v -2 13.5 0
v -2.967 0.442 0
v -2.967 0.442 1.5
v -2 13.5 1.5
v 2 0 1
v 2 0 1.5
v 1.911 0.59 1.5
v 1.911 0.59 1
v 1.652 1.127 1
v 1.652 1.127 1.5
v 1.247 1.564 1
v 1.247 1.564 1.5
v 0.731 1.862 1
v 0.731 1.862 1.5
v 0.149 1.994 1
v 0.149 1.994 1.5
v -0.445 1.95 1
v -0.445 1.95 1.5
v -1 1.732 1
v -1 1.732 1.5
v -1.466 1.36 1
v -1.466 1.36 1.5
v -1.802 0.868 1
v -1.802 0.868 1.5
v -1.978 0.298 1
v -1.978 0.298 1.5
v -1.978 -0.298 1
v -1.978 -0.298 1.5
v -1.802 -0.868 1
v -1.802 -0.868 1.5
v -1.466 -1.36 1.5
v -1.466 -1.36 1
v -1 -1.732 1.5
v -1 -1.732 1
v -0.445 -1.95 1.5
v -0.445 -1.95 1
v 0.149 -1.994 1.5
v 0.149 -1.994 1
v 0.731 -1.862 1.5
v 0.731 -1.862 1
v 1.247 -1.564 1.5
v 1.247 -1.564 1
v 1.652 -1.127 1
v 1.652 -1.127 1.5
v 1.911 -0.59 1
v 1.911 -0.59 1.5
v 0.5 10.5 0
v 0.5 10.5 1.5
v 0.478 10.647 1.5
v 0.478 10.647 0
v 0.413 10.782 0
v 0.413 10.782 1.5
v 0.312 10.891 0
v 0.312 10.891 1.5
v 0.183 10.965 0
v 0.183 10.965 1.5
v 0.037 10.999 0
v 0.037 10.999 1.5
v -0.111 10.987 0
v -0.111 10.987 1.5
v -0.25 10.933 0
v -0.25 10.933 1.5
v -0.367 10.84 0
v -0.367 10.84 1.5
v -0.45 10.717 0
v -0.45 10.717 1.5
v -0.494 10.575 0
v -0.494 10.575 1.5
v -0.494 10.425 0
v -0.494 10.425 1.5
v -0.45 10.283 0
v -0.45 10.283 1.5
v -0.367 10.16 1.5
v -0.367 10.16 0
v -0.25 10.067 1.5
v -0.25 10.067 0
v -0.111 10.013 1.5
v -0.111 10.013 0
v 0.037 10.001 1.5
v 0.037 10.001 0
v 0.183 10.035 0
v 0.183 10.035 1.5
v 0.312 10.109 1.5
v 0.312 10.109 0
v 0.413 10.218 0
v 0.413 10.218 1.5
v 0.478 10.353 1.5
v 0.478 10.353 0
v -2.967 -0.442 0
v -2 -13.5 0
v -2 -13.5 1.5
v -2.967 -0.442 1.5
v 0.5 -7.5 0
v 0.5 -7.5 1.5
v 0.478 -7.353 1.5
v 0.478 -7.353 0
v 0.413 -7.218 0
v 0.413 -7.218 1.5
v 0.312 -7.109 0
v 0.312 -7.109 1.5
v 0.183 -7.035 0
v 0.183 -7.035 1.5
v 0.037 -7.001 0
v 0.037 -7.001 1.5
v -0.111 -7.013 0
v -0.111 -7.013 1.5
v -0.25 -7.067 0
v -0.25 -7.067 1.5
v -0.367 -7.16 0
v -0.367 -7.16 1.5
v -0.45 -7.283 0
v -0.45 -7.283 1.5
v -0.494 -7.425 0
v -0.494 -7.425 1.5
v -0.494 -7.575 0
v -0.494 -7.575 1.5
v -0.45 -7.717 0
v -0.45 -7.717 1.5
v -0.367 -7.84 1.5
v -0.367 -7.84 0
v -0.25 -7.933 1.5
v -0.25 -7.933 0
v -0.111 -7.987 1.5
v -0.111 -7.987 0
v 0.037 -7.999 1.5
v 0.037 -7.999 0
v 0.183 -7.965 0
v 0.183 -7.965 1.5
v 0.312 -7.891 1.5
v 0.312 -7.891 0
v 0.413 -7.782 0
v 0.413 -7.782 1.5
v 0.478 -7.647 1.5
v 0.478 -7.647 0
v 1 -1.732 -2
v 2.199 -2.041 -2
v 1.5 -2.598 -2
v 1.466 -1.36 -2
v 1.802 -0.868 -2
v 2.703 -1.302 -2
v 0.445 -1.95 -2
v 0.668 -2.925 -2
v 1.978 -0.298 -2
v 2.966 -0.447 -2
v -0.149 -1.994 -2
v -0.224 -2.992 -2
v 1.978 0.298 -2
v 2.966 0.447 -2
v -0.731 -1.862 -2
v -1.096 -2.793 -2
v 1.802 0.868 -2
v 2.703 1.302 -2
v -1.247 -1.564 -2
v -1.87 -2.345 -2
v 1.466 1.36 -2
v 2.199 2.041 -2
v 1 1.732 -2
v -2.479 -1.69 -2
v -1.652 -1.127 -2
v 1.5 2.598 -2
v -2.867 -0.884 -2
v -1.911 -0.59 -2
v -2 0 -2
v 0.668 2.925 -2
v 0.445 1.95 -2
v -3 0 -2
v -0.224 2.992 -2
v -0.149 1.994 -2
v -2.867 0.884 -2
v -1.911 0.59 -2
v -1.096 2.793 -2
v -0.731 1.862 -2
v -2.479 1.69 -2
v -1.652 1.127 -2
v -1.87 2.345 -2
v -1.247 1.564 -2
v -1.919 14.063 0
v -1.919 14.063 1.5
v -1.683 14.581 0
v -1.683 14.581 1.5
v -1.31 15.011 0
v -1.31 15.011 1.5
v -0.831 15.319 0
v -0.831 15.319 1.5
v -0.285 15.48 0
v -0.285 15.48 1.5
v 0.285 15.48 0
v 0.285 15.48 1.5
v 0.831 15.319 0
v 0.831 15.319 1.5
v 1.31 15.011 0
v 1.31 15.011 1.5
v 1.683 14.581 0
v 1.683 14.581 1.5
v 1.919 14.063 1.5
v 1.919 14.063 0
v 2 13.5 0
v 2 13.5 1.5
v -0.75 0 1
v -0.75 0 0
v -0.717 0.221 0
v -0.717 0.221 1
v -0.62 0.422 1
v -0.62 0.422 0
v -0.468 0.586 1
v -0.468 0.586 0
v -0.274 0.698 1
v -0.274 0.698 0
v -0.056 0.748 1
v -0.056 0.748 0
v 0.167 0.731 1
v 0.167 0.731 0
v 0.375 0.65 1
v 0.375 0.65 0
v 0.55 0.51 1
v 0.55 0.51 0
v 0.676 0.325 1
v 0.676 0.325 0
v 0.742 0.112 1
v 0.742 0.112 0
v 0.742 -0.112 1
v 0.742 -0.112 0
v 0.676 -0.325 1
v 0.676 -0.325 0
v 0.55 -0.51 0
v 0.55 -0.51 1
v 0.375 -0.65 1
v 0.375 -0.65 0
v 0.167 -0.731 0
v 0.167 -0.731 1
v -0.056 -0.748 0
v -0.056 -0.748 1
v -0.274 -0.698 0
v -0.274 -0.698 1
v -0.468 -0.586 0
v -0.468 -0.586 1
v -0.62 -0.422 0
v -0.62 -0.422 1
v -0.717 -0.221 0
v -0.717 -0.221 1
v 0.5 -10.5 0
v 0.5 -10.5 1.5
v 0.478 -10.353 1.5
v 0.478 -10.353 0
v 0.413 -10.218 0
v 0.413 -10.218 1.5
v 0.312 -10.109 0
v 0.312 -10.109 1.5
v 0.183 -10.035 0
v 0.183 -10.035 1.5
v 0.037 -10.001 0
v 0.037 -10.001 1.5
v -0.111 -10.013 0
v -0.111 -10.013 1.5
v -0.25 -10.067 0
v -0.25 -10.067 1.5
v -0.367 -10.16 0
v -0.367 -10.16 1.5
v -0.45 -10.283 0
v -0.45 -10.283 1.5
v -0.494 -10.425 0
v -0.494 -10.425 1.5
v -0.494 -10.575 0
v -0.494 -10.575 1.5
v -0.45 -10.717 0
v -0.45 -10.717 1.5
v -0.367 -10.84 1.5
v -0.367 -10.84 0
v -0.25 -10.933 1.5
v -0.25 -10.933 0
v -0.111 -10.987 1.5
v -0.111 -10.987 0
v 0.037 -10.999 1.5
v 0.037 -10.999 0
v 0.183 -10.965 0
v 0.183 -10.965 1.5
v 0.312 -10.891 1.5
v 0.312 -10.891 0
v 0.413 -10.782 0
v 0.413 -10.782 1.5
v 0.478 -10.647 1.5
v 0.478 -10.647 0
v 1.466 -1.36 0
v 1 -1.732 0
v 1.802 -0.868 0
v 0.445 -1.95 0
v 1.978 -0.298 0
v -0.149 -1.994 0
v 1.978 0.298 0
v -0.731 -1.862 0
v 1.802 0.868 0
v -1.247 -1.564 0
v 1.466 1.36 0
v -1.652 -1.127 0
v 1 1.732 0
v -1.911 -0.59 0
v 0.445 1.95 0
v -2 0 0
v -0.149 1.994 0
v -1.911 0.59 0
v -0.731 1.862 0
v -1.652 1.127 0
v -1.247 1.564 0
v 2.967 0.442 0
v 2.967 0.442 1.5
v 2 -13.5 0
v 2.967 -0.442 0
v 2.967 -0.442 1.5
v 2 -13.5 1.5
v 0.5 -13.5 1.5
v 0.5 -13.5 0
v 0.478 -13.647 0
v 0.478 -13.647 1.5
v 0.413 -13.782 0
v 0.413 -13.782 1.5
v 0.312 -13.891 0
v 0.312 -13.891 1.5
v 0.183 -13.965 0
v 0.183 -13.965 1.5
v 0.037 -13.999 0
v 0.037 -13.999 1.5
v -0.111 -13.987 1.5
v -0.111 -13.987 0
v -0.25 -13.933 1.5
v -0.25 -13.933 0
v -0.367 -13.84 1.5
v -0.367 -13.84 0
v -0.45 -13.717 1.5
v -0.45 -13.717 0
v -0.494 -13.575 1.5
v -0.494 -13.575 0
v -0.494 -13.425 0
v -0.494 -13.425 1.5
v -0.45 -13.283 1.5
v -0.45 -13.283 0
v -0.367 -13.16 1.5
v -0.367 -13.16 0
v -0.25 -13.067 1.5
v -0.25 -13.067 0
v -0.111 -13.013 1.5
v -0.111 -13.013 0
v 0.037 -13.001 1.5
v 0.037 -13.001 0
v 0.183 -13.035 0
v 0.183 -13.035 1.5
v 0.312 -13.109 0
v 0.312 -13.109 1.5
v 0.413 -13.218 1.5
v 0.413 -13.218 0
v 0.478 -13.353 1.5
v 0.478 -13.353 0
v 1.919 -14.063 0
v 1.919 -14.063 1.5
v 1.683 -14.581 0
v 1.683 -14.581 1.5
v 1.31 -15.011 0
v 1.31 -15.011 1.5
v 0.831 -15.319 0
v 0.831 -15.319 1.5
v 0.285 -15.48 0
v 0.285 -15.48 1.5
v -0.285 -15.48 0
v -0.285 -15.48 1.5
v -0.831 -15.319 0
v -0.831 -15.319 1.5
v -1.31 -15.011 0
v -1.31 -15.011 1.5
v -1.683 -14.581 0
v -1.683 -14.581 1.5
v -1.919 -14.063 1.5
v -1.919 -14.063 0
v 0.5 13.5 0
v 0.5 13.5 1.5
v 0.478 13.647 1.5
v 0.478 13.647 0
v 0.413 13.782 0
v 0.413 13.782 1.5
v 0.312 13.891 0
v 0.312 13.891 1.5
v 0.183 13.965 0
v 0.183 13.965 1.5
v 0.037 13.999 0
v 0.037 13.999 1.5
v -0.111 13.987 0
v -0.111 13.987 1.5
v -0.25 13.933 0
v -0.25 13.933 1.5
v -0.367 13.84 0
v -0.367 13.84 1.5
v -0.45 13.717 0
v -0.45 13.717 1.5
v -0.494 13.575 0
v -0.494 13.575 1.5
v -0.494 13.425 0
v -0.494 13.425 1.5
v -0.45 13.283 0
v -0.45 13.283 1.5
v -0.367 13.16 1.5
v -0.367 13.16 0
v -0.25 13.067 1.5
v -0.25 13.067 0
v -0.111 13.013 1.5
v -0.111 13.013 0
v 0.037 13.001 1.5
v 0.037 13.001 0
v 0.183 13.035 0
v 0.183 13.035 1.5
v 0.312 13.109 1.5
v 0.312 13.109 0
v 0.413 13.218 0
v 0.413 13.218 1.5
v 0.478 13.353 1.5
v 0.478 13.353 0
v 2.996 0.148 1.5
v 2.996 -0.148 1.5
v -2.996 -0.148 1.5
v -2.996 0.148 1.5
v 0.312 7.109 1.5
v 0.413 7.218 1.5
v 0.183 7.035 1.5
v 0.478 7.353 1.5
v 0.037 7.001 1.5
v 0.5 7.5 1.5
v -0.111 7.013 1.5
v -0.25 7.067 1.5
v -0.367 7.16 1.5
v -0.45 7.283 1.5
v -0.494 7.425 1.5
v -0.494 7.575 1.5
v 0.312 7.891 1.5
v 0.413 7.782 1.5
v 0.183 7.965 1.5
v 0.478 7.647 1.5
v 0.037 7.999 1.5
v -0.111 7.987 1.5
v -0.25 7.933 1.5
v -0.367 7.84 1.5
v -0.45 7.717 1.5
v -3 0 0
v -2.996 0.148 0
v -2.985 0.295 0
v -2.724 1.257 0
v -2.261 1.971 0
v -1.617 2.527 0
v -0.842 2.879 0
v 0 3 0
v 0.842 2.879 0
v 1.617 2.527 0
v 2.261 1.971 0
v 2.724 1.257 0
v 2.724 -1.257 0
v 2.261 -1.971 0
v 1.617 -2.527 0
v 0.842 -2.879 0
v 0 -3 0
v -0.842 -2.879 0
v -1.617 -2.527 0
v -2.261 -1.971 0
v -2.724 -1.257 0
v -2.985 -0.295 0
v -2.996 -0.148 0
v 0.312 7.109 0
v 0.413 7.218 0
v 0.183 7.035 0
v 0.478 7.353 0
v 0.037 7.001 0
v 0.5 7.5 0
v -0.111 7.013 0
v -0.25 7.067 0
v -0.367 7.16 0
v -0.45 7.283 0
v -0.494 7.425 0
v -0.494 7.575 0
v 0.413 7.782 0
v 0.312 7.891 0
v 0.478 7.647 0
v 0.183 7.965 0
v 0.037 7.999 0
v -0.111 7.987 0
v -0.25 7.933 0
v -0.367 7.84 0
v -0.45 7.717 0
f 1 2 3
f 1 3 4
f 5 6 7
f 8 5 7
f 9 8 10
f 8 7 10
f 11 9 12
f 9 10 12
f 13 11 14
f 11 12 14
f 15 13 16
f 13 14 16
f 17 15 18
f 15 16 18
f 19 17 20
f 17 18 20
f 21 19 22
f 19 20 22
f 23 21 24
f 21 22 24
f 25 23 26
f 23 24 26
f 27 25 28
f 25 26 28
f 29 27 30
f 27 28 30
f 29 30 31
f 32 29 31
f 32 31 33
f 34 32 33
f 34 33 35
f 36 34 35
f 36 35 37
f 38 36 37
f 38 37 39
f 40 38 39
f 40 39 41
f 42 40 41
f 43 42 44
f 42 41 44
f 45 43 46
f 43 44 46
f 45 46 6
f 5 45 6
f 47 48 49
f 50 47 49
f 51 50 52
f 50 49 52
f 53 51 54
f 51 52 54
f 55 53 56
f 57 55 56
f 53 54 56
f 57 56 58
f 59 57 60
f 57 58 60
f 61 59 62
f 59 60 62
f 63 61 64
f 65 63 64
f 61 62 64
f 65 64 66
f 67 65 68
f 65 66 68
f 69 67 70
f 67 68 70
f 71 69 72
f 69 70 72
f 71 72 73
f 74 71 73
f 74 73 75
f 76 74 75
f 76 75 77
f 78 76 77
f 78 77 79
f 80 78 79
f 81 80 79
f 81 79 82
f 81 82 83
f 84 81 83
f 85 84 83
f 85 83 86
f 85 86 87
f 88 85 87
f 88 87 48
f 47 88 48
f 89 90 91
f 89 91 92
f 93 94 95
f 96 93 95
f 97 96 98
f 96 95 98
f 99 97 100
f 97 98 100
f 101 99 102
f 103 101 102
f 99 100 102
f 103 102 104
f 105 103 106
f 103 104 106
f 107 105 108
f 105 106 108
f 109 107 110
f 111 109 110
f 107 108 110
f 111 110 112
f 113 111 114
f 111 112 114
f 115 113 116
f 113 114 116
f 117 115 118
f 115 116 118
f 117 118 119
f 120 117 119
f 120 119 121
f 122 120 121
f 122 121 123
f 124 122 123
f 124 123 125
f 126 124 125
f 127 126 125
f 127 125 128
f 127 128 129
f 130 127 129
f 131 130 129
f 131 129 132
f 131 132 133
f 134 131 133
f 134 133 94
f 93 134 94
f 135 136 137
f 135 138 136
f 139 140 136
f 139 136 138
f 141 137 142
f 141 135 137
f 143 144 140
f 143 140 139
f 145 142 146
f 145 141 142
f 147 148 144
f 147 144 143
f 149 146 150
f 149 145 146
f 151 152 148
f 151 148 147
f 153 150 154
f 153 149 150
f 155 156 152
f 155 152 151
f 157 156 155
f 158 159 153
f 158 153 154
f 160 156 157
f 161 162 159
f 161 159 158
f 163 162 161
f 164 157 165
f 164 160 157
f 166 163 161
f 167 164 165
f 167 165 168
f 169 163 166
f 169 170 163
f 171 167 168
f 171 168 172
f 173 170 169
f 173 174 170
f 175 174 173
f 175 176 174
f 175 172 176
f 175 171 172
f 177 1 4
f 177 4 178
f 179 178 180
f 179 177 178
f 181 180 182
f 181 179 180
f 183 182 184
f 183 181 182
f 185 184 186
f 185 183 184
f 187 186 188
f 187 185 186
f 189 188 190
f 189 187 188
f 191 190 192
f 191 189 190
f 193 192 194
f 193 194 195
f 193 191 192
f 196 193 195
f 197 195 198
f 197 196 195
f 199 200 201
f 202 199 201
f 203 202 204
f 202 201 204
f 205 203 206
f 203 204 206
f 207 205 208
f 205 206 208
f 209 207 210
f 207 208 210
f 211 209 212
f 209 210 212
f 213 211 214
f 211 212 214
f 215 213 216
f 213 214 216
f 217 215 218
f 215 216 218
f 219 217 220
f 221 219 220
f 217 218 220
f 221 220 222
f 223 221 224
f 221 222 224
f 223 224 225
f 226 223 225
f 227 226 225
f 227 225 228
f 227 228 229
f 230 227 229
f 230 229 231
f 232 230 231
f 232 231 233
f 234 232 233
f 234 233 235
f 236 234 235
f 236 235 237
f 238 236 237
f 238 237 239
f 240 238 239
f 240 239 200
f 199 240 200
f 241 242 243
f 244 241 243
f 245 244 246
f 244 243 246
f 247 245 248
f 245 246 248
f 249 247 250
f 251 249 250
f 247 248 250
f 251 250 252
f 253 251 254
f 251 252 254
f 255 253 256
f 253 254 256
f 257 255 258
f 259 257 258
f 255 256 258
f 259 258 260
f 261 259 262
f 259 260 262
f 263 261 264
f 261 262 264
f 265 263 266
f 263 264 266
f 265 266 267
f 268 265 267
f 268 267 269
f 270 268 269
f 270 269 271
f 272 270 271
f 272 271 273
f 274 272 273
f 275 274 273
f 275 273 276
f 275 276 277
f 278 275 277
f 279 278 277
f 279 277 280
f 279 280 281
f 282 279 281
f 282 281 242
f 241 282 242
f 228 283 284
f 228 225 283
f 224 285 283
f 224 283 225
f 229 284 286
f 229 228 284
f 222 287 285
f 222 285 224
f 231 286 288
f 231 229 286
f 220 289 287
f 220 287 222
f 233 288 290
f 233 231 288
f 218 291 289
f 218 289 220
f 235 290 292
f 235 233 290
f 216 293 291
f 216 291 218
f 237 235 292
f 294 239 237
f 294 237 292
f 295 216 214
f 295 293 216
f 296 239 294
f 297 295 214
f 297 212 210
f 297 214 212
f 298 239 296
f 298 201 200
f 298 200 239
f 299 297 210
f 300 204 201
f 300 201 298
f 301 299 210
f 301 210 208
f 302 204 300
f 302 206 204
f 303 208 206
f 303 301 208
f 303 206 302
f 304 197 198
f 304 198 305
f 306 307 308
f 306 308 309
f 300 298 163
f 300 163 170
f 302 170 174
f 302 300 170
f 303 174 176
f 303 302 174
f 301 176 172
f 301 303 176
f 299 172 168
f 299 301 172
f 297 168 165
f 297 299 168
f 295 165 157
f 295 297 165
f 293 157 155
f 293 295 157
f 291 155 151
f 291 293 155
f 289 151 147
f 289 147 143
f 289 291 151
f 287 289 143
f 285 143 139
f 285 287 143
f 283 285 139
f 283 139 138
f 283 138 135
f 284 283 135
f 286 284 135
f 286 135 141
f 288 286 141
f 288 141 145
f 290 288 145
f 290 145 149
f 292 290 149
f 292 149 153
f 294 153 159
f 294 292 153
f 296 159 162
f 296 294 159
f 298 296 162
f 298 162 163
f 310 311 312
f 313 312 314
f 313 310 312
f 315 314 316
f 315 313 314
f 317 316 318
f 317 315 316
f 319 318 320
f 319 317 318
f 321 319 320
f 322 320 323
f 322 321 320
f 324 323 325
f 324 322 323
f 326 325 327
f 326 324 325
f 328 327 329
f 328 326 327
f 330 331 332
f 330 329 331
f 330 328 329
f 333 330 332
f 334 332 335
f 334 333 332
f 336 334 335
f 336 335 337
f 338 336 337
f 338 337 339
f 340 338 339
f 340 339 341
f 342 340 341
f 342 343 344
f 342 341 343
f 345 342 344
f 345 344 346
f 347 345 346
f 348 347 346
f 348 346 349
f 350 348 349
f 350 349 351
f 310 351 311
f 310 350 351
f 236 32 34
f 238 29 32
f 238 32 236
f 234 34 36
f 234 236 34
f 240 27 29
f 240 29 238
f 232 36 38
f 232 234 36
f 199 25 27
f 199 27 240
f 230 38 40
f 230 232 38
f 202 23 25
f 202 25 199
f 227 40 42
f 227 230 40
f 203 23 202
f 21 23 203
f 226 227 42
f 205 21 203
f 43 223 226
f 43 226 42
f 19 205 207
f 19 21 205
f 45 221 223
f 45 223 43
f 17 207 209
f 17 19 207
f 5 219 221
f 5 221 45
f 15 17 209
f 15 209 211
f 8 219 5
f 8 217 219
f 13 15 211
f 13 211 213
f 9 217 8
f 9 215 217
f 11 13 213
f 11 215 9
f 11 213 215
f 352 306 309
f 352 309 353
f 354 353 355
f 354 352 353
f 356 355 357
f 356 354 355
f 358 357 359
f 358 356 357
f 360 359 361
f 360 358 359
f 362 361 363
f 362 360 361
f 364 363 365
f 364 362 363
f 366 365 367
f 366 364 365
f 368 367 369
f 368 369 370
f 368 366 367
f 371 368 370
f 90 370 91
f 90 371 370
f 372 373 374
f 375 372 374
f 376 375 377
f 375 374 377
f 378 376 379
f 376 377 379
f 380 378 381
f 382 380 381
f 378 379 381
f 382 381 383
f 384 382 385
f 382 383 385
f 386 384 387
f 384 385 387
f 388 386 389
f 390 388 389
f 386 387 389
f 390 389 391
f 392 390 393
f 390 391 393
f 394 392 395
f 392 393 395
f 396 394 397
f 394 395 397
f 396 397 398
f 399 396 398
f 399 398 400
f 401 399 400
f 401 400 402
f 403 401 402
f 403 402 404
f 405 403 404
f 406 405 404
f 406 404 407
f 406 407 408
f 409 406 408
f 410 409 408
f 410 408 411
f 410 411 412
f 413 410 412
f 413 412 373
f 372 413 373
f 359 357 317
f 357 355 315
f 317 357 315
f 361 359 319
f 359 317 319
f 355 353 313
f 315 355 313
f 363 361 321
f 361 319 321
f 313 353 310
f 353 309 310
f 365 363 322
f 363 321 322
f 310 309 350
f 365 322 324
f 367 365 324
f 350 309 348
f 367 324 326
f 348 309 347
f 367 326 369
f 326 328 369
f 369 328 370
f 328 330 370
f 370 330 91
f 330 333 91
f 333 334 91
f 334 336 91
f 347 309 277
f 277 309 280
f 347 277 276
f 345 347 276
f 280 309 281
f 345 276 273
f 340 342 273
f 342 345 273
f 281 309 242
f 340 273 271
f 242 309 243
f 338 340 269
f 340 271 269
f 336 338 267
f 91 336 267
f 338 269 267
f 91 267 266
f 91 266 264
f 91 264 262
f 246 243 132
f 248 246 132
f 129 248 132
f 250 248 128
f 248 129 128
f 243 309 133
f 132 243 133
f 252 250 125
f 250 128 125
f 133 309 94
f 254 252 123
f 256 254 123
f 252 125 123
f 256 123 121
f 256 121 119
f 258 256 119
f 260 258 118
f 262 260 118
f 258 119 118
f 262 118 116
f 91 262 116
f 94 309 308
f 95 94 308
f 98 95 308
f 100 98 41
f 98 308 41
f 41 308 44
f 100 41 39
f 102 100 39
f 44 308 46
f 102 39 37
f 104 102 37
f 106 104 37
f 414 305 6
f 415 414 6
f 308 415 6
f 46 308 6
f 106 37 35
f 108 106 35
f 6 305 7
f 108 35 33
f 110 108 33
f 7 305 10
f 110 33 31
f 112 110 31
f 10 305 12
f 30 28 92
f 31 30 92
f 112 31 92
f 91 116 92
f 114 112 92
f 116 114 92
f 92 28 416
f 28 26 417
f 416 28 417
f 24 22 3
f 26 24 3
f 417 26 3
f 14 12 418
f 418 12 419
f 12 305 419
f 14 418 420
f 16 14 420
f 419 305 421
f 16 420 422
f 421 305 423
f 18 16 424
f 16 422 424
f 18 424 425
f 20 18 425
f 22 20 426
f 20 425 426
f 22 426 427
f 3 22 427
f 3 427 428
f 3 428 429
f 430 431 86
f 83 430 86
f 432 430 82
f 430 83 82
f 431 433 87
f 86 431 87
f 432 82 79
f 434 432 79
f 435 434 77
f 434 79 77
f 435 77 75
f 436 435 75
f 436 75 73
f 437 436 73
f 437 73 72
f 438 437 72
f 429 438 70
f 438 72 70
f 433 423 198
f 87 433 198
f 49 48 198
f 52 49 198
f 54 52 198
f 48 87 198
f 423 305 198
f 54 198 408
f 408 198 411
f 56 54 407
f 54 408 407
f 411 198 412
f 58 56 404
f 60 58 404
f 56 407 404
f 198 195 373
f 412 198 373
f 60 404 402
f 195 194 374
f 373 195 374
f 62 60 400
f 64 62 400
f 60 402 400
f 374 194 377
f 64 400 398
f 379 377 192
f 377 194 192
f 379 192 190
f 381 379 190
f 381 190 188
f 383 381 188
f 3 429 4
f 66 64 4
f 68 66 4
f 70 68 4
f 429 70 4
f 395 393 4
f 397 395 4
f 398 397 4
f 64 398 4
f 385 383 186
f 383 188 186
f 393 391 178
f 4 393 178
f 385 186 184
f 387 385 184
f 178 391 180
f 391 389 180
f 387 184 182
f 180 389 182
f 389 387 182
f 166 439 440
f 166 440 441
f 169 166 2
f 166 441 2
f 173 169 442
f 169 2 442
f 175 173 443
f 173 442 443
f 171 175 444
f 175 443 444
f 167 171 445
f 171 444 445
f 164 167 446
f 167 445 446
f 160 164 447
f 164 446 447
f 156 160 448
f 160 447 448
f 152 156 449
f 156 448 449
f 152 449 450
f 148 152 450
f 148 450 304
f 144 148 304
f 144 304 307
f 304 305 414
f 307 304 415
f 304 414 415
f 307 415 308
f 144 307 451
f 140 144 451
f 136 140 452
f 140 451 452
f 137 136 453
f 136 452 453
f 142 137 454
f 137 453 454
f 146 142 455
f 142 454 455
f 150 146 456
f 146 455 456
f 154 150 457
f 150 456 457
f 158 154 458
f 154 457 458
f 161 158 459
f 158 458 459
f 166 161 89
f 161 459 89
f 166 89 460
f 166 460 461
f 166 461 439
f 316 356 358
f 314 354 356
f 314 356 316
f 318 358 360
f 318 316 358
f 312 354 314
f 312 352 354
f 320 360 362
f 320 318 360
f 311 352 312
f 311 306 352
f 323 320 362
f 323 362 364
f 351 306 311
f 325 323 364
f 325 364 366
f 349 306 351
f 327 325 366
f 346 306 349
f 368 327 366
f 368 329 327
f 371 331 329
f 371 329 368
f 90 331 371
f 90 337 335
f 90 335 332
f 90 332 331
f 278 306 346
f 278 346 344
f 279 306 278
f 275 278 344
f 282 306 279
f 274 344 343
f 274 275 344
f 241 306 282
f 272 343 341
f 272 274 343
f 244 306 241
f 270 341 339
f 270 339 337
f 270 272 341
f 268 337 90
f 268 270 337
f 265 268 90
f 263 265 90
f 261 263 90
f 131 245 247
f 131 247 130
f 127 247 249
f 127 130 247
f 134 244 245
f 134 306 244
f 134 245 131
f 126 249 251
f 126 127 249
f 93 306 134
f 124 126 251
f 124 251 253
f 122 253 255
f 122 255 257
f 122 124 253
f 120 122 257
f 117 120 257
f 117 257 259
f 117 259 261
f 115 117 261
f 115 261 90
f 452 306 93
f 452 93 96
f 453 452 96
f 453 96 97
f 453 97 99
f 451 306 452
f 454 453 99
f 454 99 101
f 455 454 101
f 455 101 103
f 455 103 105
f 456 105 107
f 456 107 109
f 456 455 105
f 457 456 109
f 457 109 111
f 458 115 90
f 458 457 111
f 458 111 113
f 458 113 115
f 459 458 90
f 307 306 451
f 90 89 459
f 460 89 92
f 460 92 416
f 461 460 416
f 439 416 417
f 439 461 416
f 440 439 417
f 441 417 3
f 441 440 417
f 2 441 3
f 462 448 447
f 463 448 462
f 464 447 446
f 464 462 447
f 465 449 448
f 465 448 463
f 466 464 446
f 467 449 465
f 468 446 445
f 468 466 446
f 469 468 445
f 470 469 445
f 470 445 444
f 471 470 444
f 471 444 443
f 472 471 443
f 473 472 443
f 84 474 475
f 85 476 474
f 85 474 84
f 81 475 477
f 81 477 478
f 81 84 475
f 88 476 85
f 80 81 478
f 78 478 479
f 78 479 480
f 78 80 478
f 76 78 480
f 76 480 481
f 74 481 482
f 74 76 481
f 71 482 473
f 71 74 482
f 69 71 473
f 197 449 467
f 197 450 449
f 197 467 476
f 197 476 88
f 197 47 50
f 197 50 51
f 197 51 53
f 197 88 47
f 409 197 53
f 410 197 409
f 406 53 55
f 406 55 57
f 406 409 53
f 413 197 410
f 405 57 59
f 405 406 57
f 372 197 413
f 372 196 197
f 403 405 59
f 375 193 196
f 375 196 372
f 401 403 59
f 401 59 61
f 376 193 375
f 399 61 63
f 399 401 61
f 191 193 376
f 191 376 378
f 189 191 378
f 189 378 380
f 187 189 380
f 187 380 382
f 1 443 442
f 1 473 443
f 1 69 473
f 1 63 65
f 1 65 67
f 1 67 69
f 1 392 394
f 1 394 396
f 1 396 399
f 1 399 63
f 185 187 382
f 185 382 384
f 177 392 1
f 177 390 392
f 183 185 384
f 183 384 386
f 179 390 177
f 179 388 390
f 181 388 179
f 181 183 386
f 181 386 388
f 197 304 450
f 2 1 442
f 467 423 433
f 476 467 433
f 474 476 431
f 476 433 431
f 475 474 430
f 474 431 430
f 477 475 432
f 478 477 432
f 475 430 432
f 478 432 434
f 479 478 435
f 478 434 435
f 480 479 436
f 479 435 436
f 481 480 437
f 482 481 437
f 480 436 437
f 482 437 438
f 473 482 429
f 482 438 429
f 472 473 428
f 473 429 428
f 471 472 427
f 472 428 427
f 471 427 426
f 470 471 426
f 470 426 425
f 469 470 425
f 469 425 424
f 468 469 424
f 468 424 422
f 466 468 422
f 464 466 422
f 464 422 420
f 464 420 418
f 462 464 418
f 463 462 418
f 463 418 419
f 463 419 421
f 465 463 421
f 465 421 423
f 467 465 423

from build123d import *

# Parameters (mm, degrees)
BOSS_EXTRU_2_DEPTH         = 1.5
ESQUISSE2_R                = 3
ESQUISSE2_R_2              = 2
BOSS_EXTRU_3_DEPTH         = 2
ESQUISSE3_R                = 0.75
ENL_V_MAT_EXTRU_1_DEPTH    = 2
ESQUISSE4_R                = 2
ENL_V_MAT_EXTRU_2_DEPTH    = 0.5
ESQUISSE5_R                = 0.5
ENL_V_MAT_EXTRU_3_DEPTH    = 4.5
R_P_TITION_LIN_AIRE1_COUNT = 3
R_P_TITION_LIN_AIRE1_PITCH = 3
SYM_TRIE1_COPY_1_SKETCH_R  = 0.5
SYM_TRIE1_COPY_1_DEPTH     = 4.5
SYM_TRIE1_COPY_2_SKETCH_R  = 0.5
SYM_TRIE1_COPY_2_DEPTH     = 4.5


with BuildPart() as part:
    # Esquisse1 → Boss.-Extru.2 (new body)
    with BuildSketch(Plane.XY):
        with BuildLine():
            Line((2, 13.5), (2.967257844, 0.4420191))
            ThreePointArc((2.967257844, 0.4420191), (3, 0), (2.967257844, -0.4420191))
            Line((2.967257844, -0.4420191), (2, -13.5))
            ThreePointArc((2, -13.5), (0, -15.5), (-2, -13.5))
            Line((-2, -13.5), (-2.967257844, -0.4420191))
            ThreePointArc((-2.967257844, -0.4420191), (-3, 0), (-2.967257844, 0.4420191))
            Line((-2.967257844, 0.4420191), (-2, 13.5))
            ThreePointArc((-2, 13.5), (0, 15.5), (2, 13.5))
        make_face()
    extrude(amount=BOSS_EXTRU_2_DEPTH)

    # Esquisse2 → Boss.-Extru.3 (add)
    with BuildSketch(Plane(origin=(0, 0, 0), x_dir=(-1, 0, 0), z_dir=(0, 0, -1))):
        Circle(ESQUISSE2_R)
        Circle(ESQUISSE2_R_2, mode=Mode.SUBTRACT)
    extrude(amount=BOSS_EXTRU_3_DEPTH)

    # Esquisse3 → Enlèv. mat.-Extru.1 (cut)
    with BuildSketch(Plane(origin=(0, 0, 0), x_dir=(-1, 0, 0), z_dir=(0, 0, -1))):
        Circle(ESQUISSE3_R)
    extrude(amount=-ENL_V_MAT_EXTRU_1_DEPTH, mode=Mode.SUBTRACT)

    # Esquisse4 → Enlèv. mat.-Extru.2 (cut)
    with BuildSketch(Plane.XY.offset(1.5)):
        Circle(ESQUISSE4_R)
    extrude(amount=-ENL_V_MAT_EXTRU_2_DEPTH, mode=Mode.SUBTRACT)

    # Esquisse5 → Enlèv. mat.-Extru.3 (cut, through all)
    with BuildSketch(Plane.XY.offset(1.5)):
        with Locations((0, 13.5)):
            Circle(ESQUISSE5_R)
    enl_v_mat_extru_3 = extrude(amount=-ENL_V_MAT_EXTRU_3_DEPTH, mode=Mode.SUBTRACT)

    # Répétition linéaire1: Enlèv. mat.-Extru.3 ×3
    with Locations(*[(0, -i * R_P_TITION_LIN_AIRE1_PITCH, 0) for i in range(1, R_P_TITION_LIN_AIRE1_COUNT)]):
        add(enl_v_mat_extru_3, mode=Mode.SUBTRACT)

    # Symétrie1: Enlèv. mat.-Extru.3 across plane
    add(enl_v_mat_extru_3.mirror(Plane.ZX), mode=Mode.SUBTRACT)

    # Symétrie1 copy 1 sketch → Symétrie1 copy 1 (cut, through all)
    with BuildSketch(Plane(origin=(0, 3, 1.5), x_dir=(1, 0, 0), z_dir=(0, 0, 1))):
        with Locations((0, -13.5)):
            Circle(SYM_TRIE1_COPY_1_SKETCH_R)
    extrude(amount=-SYM_TRIE1_COPY_1_DEPTH, mode=Mode.SUBTRACT)

    # Symétrie1 copy 2 sketch → Symétrie1 copy 2 (cut, through all)
    with BuildSketch(Plane(origin=(0, 6, 1.5), x_dir=(1, 0, 0), z_dir=(0, 0, 1))):
        with Locations((0, -13.5)):
            Circle(SYM_TRIE1_COPY_2_SKETCH_R)
    extrude(amount=-SYM_TRIE1_COPY_2_DEPTH, mode=Mode.SUBTRACT)


solid = part.part
